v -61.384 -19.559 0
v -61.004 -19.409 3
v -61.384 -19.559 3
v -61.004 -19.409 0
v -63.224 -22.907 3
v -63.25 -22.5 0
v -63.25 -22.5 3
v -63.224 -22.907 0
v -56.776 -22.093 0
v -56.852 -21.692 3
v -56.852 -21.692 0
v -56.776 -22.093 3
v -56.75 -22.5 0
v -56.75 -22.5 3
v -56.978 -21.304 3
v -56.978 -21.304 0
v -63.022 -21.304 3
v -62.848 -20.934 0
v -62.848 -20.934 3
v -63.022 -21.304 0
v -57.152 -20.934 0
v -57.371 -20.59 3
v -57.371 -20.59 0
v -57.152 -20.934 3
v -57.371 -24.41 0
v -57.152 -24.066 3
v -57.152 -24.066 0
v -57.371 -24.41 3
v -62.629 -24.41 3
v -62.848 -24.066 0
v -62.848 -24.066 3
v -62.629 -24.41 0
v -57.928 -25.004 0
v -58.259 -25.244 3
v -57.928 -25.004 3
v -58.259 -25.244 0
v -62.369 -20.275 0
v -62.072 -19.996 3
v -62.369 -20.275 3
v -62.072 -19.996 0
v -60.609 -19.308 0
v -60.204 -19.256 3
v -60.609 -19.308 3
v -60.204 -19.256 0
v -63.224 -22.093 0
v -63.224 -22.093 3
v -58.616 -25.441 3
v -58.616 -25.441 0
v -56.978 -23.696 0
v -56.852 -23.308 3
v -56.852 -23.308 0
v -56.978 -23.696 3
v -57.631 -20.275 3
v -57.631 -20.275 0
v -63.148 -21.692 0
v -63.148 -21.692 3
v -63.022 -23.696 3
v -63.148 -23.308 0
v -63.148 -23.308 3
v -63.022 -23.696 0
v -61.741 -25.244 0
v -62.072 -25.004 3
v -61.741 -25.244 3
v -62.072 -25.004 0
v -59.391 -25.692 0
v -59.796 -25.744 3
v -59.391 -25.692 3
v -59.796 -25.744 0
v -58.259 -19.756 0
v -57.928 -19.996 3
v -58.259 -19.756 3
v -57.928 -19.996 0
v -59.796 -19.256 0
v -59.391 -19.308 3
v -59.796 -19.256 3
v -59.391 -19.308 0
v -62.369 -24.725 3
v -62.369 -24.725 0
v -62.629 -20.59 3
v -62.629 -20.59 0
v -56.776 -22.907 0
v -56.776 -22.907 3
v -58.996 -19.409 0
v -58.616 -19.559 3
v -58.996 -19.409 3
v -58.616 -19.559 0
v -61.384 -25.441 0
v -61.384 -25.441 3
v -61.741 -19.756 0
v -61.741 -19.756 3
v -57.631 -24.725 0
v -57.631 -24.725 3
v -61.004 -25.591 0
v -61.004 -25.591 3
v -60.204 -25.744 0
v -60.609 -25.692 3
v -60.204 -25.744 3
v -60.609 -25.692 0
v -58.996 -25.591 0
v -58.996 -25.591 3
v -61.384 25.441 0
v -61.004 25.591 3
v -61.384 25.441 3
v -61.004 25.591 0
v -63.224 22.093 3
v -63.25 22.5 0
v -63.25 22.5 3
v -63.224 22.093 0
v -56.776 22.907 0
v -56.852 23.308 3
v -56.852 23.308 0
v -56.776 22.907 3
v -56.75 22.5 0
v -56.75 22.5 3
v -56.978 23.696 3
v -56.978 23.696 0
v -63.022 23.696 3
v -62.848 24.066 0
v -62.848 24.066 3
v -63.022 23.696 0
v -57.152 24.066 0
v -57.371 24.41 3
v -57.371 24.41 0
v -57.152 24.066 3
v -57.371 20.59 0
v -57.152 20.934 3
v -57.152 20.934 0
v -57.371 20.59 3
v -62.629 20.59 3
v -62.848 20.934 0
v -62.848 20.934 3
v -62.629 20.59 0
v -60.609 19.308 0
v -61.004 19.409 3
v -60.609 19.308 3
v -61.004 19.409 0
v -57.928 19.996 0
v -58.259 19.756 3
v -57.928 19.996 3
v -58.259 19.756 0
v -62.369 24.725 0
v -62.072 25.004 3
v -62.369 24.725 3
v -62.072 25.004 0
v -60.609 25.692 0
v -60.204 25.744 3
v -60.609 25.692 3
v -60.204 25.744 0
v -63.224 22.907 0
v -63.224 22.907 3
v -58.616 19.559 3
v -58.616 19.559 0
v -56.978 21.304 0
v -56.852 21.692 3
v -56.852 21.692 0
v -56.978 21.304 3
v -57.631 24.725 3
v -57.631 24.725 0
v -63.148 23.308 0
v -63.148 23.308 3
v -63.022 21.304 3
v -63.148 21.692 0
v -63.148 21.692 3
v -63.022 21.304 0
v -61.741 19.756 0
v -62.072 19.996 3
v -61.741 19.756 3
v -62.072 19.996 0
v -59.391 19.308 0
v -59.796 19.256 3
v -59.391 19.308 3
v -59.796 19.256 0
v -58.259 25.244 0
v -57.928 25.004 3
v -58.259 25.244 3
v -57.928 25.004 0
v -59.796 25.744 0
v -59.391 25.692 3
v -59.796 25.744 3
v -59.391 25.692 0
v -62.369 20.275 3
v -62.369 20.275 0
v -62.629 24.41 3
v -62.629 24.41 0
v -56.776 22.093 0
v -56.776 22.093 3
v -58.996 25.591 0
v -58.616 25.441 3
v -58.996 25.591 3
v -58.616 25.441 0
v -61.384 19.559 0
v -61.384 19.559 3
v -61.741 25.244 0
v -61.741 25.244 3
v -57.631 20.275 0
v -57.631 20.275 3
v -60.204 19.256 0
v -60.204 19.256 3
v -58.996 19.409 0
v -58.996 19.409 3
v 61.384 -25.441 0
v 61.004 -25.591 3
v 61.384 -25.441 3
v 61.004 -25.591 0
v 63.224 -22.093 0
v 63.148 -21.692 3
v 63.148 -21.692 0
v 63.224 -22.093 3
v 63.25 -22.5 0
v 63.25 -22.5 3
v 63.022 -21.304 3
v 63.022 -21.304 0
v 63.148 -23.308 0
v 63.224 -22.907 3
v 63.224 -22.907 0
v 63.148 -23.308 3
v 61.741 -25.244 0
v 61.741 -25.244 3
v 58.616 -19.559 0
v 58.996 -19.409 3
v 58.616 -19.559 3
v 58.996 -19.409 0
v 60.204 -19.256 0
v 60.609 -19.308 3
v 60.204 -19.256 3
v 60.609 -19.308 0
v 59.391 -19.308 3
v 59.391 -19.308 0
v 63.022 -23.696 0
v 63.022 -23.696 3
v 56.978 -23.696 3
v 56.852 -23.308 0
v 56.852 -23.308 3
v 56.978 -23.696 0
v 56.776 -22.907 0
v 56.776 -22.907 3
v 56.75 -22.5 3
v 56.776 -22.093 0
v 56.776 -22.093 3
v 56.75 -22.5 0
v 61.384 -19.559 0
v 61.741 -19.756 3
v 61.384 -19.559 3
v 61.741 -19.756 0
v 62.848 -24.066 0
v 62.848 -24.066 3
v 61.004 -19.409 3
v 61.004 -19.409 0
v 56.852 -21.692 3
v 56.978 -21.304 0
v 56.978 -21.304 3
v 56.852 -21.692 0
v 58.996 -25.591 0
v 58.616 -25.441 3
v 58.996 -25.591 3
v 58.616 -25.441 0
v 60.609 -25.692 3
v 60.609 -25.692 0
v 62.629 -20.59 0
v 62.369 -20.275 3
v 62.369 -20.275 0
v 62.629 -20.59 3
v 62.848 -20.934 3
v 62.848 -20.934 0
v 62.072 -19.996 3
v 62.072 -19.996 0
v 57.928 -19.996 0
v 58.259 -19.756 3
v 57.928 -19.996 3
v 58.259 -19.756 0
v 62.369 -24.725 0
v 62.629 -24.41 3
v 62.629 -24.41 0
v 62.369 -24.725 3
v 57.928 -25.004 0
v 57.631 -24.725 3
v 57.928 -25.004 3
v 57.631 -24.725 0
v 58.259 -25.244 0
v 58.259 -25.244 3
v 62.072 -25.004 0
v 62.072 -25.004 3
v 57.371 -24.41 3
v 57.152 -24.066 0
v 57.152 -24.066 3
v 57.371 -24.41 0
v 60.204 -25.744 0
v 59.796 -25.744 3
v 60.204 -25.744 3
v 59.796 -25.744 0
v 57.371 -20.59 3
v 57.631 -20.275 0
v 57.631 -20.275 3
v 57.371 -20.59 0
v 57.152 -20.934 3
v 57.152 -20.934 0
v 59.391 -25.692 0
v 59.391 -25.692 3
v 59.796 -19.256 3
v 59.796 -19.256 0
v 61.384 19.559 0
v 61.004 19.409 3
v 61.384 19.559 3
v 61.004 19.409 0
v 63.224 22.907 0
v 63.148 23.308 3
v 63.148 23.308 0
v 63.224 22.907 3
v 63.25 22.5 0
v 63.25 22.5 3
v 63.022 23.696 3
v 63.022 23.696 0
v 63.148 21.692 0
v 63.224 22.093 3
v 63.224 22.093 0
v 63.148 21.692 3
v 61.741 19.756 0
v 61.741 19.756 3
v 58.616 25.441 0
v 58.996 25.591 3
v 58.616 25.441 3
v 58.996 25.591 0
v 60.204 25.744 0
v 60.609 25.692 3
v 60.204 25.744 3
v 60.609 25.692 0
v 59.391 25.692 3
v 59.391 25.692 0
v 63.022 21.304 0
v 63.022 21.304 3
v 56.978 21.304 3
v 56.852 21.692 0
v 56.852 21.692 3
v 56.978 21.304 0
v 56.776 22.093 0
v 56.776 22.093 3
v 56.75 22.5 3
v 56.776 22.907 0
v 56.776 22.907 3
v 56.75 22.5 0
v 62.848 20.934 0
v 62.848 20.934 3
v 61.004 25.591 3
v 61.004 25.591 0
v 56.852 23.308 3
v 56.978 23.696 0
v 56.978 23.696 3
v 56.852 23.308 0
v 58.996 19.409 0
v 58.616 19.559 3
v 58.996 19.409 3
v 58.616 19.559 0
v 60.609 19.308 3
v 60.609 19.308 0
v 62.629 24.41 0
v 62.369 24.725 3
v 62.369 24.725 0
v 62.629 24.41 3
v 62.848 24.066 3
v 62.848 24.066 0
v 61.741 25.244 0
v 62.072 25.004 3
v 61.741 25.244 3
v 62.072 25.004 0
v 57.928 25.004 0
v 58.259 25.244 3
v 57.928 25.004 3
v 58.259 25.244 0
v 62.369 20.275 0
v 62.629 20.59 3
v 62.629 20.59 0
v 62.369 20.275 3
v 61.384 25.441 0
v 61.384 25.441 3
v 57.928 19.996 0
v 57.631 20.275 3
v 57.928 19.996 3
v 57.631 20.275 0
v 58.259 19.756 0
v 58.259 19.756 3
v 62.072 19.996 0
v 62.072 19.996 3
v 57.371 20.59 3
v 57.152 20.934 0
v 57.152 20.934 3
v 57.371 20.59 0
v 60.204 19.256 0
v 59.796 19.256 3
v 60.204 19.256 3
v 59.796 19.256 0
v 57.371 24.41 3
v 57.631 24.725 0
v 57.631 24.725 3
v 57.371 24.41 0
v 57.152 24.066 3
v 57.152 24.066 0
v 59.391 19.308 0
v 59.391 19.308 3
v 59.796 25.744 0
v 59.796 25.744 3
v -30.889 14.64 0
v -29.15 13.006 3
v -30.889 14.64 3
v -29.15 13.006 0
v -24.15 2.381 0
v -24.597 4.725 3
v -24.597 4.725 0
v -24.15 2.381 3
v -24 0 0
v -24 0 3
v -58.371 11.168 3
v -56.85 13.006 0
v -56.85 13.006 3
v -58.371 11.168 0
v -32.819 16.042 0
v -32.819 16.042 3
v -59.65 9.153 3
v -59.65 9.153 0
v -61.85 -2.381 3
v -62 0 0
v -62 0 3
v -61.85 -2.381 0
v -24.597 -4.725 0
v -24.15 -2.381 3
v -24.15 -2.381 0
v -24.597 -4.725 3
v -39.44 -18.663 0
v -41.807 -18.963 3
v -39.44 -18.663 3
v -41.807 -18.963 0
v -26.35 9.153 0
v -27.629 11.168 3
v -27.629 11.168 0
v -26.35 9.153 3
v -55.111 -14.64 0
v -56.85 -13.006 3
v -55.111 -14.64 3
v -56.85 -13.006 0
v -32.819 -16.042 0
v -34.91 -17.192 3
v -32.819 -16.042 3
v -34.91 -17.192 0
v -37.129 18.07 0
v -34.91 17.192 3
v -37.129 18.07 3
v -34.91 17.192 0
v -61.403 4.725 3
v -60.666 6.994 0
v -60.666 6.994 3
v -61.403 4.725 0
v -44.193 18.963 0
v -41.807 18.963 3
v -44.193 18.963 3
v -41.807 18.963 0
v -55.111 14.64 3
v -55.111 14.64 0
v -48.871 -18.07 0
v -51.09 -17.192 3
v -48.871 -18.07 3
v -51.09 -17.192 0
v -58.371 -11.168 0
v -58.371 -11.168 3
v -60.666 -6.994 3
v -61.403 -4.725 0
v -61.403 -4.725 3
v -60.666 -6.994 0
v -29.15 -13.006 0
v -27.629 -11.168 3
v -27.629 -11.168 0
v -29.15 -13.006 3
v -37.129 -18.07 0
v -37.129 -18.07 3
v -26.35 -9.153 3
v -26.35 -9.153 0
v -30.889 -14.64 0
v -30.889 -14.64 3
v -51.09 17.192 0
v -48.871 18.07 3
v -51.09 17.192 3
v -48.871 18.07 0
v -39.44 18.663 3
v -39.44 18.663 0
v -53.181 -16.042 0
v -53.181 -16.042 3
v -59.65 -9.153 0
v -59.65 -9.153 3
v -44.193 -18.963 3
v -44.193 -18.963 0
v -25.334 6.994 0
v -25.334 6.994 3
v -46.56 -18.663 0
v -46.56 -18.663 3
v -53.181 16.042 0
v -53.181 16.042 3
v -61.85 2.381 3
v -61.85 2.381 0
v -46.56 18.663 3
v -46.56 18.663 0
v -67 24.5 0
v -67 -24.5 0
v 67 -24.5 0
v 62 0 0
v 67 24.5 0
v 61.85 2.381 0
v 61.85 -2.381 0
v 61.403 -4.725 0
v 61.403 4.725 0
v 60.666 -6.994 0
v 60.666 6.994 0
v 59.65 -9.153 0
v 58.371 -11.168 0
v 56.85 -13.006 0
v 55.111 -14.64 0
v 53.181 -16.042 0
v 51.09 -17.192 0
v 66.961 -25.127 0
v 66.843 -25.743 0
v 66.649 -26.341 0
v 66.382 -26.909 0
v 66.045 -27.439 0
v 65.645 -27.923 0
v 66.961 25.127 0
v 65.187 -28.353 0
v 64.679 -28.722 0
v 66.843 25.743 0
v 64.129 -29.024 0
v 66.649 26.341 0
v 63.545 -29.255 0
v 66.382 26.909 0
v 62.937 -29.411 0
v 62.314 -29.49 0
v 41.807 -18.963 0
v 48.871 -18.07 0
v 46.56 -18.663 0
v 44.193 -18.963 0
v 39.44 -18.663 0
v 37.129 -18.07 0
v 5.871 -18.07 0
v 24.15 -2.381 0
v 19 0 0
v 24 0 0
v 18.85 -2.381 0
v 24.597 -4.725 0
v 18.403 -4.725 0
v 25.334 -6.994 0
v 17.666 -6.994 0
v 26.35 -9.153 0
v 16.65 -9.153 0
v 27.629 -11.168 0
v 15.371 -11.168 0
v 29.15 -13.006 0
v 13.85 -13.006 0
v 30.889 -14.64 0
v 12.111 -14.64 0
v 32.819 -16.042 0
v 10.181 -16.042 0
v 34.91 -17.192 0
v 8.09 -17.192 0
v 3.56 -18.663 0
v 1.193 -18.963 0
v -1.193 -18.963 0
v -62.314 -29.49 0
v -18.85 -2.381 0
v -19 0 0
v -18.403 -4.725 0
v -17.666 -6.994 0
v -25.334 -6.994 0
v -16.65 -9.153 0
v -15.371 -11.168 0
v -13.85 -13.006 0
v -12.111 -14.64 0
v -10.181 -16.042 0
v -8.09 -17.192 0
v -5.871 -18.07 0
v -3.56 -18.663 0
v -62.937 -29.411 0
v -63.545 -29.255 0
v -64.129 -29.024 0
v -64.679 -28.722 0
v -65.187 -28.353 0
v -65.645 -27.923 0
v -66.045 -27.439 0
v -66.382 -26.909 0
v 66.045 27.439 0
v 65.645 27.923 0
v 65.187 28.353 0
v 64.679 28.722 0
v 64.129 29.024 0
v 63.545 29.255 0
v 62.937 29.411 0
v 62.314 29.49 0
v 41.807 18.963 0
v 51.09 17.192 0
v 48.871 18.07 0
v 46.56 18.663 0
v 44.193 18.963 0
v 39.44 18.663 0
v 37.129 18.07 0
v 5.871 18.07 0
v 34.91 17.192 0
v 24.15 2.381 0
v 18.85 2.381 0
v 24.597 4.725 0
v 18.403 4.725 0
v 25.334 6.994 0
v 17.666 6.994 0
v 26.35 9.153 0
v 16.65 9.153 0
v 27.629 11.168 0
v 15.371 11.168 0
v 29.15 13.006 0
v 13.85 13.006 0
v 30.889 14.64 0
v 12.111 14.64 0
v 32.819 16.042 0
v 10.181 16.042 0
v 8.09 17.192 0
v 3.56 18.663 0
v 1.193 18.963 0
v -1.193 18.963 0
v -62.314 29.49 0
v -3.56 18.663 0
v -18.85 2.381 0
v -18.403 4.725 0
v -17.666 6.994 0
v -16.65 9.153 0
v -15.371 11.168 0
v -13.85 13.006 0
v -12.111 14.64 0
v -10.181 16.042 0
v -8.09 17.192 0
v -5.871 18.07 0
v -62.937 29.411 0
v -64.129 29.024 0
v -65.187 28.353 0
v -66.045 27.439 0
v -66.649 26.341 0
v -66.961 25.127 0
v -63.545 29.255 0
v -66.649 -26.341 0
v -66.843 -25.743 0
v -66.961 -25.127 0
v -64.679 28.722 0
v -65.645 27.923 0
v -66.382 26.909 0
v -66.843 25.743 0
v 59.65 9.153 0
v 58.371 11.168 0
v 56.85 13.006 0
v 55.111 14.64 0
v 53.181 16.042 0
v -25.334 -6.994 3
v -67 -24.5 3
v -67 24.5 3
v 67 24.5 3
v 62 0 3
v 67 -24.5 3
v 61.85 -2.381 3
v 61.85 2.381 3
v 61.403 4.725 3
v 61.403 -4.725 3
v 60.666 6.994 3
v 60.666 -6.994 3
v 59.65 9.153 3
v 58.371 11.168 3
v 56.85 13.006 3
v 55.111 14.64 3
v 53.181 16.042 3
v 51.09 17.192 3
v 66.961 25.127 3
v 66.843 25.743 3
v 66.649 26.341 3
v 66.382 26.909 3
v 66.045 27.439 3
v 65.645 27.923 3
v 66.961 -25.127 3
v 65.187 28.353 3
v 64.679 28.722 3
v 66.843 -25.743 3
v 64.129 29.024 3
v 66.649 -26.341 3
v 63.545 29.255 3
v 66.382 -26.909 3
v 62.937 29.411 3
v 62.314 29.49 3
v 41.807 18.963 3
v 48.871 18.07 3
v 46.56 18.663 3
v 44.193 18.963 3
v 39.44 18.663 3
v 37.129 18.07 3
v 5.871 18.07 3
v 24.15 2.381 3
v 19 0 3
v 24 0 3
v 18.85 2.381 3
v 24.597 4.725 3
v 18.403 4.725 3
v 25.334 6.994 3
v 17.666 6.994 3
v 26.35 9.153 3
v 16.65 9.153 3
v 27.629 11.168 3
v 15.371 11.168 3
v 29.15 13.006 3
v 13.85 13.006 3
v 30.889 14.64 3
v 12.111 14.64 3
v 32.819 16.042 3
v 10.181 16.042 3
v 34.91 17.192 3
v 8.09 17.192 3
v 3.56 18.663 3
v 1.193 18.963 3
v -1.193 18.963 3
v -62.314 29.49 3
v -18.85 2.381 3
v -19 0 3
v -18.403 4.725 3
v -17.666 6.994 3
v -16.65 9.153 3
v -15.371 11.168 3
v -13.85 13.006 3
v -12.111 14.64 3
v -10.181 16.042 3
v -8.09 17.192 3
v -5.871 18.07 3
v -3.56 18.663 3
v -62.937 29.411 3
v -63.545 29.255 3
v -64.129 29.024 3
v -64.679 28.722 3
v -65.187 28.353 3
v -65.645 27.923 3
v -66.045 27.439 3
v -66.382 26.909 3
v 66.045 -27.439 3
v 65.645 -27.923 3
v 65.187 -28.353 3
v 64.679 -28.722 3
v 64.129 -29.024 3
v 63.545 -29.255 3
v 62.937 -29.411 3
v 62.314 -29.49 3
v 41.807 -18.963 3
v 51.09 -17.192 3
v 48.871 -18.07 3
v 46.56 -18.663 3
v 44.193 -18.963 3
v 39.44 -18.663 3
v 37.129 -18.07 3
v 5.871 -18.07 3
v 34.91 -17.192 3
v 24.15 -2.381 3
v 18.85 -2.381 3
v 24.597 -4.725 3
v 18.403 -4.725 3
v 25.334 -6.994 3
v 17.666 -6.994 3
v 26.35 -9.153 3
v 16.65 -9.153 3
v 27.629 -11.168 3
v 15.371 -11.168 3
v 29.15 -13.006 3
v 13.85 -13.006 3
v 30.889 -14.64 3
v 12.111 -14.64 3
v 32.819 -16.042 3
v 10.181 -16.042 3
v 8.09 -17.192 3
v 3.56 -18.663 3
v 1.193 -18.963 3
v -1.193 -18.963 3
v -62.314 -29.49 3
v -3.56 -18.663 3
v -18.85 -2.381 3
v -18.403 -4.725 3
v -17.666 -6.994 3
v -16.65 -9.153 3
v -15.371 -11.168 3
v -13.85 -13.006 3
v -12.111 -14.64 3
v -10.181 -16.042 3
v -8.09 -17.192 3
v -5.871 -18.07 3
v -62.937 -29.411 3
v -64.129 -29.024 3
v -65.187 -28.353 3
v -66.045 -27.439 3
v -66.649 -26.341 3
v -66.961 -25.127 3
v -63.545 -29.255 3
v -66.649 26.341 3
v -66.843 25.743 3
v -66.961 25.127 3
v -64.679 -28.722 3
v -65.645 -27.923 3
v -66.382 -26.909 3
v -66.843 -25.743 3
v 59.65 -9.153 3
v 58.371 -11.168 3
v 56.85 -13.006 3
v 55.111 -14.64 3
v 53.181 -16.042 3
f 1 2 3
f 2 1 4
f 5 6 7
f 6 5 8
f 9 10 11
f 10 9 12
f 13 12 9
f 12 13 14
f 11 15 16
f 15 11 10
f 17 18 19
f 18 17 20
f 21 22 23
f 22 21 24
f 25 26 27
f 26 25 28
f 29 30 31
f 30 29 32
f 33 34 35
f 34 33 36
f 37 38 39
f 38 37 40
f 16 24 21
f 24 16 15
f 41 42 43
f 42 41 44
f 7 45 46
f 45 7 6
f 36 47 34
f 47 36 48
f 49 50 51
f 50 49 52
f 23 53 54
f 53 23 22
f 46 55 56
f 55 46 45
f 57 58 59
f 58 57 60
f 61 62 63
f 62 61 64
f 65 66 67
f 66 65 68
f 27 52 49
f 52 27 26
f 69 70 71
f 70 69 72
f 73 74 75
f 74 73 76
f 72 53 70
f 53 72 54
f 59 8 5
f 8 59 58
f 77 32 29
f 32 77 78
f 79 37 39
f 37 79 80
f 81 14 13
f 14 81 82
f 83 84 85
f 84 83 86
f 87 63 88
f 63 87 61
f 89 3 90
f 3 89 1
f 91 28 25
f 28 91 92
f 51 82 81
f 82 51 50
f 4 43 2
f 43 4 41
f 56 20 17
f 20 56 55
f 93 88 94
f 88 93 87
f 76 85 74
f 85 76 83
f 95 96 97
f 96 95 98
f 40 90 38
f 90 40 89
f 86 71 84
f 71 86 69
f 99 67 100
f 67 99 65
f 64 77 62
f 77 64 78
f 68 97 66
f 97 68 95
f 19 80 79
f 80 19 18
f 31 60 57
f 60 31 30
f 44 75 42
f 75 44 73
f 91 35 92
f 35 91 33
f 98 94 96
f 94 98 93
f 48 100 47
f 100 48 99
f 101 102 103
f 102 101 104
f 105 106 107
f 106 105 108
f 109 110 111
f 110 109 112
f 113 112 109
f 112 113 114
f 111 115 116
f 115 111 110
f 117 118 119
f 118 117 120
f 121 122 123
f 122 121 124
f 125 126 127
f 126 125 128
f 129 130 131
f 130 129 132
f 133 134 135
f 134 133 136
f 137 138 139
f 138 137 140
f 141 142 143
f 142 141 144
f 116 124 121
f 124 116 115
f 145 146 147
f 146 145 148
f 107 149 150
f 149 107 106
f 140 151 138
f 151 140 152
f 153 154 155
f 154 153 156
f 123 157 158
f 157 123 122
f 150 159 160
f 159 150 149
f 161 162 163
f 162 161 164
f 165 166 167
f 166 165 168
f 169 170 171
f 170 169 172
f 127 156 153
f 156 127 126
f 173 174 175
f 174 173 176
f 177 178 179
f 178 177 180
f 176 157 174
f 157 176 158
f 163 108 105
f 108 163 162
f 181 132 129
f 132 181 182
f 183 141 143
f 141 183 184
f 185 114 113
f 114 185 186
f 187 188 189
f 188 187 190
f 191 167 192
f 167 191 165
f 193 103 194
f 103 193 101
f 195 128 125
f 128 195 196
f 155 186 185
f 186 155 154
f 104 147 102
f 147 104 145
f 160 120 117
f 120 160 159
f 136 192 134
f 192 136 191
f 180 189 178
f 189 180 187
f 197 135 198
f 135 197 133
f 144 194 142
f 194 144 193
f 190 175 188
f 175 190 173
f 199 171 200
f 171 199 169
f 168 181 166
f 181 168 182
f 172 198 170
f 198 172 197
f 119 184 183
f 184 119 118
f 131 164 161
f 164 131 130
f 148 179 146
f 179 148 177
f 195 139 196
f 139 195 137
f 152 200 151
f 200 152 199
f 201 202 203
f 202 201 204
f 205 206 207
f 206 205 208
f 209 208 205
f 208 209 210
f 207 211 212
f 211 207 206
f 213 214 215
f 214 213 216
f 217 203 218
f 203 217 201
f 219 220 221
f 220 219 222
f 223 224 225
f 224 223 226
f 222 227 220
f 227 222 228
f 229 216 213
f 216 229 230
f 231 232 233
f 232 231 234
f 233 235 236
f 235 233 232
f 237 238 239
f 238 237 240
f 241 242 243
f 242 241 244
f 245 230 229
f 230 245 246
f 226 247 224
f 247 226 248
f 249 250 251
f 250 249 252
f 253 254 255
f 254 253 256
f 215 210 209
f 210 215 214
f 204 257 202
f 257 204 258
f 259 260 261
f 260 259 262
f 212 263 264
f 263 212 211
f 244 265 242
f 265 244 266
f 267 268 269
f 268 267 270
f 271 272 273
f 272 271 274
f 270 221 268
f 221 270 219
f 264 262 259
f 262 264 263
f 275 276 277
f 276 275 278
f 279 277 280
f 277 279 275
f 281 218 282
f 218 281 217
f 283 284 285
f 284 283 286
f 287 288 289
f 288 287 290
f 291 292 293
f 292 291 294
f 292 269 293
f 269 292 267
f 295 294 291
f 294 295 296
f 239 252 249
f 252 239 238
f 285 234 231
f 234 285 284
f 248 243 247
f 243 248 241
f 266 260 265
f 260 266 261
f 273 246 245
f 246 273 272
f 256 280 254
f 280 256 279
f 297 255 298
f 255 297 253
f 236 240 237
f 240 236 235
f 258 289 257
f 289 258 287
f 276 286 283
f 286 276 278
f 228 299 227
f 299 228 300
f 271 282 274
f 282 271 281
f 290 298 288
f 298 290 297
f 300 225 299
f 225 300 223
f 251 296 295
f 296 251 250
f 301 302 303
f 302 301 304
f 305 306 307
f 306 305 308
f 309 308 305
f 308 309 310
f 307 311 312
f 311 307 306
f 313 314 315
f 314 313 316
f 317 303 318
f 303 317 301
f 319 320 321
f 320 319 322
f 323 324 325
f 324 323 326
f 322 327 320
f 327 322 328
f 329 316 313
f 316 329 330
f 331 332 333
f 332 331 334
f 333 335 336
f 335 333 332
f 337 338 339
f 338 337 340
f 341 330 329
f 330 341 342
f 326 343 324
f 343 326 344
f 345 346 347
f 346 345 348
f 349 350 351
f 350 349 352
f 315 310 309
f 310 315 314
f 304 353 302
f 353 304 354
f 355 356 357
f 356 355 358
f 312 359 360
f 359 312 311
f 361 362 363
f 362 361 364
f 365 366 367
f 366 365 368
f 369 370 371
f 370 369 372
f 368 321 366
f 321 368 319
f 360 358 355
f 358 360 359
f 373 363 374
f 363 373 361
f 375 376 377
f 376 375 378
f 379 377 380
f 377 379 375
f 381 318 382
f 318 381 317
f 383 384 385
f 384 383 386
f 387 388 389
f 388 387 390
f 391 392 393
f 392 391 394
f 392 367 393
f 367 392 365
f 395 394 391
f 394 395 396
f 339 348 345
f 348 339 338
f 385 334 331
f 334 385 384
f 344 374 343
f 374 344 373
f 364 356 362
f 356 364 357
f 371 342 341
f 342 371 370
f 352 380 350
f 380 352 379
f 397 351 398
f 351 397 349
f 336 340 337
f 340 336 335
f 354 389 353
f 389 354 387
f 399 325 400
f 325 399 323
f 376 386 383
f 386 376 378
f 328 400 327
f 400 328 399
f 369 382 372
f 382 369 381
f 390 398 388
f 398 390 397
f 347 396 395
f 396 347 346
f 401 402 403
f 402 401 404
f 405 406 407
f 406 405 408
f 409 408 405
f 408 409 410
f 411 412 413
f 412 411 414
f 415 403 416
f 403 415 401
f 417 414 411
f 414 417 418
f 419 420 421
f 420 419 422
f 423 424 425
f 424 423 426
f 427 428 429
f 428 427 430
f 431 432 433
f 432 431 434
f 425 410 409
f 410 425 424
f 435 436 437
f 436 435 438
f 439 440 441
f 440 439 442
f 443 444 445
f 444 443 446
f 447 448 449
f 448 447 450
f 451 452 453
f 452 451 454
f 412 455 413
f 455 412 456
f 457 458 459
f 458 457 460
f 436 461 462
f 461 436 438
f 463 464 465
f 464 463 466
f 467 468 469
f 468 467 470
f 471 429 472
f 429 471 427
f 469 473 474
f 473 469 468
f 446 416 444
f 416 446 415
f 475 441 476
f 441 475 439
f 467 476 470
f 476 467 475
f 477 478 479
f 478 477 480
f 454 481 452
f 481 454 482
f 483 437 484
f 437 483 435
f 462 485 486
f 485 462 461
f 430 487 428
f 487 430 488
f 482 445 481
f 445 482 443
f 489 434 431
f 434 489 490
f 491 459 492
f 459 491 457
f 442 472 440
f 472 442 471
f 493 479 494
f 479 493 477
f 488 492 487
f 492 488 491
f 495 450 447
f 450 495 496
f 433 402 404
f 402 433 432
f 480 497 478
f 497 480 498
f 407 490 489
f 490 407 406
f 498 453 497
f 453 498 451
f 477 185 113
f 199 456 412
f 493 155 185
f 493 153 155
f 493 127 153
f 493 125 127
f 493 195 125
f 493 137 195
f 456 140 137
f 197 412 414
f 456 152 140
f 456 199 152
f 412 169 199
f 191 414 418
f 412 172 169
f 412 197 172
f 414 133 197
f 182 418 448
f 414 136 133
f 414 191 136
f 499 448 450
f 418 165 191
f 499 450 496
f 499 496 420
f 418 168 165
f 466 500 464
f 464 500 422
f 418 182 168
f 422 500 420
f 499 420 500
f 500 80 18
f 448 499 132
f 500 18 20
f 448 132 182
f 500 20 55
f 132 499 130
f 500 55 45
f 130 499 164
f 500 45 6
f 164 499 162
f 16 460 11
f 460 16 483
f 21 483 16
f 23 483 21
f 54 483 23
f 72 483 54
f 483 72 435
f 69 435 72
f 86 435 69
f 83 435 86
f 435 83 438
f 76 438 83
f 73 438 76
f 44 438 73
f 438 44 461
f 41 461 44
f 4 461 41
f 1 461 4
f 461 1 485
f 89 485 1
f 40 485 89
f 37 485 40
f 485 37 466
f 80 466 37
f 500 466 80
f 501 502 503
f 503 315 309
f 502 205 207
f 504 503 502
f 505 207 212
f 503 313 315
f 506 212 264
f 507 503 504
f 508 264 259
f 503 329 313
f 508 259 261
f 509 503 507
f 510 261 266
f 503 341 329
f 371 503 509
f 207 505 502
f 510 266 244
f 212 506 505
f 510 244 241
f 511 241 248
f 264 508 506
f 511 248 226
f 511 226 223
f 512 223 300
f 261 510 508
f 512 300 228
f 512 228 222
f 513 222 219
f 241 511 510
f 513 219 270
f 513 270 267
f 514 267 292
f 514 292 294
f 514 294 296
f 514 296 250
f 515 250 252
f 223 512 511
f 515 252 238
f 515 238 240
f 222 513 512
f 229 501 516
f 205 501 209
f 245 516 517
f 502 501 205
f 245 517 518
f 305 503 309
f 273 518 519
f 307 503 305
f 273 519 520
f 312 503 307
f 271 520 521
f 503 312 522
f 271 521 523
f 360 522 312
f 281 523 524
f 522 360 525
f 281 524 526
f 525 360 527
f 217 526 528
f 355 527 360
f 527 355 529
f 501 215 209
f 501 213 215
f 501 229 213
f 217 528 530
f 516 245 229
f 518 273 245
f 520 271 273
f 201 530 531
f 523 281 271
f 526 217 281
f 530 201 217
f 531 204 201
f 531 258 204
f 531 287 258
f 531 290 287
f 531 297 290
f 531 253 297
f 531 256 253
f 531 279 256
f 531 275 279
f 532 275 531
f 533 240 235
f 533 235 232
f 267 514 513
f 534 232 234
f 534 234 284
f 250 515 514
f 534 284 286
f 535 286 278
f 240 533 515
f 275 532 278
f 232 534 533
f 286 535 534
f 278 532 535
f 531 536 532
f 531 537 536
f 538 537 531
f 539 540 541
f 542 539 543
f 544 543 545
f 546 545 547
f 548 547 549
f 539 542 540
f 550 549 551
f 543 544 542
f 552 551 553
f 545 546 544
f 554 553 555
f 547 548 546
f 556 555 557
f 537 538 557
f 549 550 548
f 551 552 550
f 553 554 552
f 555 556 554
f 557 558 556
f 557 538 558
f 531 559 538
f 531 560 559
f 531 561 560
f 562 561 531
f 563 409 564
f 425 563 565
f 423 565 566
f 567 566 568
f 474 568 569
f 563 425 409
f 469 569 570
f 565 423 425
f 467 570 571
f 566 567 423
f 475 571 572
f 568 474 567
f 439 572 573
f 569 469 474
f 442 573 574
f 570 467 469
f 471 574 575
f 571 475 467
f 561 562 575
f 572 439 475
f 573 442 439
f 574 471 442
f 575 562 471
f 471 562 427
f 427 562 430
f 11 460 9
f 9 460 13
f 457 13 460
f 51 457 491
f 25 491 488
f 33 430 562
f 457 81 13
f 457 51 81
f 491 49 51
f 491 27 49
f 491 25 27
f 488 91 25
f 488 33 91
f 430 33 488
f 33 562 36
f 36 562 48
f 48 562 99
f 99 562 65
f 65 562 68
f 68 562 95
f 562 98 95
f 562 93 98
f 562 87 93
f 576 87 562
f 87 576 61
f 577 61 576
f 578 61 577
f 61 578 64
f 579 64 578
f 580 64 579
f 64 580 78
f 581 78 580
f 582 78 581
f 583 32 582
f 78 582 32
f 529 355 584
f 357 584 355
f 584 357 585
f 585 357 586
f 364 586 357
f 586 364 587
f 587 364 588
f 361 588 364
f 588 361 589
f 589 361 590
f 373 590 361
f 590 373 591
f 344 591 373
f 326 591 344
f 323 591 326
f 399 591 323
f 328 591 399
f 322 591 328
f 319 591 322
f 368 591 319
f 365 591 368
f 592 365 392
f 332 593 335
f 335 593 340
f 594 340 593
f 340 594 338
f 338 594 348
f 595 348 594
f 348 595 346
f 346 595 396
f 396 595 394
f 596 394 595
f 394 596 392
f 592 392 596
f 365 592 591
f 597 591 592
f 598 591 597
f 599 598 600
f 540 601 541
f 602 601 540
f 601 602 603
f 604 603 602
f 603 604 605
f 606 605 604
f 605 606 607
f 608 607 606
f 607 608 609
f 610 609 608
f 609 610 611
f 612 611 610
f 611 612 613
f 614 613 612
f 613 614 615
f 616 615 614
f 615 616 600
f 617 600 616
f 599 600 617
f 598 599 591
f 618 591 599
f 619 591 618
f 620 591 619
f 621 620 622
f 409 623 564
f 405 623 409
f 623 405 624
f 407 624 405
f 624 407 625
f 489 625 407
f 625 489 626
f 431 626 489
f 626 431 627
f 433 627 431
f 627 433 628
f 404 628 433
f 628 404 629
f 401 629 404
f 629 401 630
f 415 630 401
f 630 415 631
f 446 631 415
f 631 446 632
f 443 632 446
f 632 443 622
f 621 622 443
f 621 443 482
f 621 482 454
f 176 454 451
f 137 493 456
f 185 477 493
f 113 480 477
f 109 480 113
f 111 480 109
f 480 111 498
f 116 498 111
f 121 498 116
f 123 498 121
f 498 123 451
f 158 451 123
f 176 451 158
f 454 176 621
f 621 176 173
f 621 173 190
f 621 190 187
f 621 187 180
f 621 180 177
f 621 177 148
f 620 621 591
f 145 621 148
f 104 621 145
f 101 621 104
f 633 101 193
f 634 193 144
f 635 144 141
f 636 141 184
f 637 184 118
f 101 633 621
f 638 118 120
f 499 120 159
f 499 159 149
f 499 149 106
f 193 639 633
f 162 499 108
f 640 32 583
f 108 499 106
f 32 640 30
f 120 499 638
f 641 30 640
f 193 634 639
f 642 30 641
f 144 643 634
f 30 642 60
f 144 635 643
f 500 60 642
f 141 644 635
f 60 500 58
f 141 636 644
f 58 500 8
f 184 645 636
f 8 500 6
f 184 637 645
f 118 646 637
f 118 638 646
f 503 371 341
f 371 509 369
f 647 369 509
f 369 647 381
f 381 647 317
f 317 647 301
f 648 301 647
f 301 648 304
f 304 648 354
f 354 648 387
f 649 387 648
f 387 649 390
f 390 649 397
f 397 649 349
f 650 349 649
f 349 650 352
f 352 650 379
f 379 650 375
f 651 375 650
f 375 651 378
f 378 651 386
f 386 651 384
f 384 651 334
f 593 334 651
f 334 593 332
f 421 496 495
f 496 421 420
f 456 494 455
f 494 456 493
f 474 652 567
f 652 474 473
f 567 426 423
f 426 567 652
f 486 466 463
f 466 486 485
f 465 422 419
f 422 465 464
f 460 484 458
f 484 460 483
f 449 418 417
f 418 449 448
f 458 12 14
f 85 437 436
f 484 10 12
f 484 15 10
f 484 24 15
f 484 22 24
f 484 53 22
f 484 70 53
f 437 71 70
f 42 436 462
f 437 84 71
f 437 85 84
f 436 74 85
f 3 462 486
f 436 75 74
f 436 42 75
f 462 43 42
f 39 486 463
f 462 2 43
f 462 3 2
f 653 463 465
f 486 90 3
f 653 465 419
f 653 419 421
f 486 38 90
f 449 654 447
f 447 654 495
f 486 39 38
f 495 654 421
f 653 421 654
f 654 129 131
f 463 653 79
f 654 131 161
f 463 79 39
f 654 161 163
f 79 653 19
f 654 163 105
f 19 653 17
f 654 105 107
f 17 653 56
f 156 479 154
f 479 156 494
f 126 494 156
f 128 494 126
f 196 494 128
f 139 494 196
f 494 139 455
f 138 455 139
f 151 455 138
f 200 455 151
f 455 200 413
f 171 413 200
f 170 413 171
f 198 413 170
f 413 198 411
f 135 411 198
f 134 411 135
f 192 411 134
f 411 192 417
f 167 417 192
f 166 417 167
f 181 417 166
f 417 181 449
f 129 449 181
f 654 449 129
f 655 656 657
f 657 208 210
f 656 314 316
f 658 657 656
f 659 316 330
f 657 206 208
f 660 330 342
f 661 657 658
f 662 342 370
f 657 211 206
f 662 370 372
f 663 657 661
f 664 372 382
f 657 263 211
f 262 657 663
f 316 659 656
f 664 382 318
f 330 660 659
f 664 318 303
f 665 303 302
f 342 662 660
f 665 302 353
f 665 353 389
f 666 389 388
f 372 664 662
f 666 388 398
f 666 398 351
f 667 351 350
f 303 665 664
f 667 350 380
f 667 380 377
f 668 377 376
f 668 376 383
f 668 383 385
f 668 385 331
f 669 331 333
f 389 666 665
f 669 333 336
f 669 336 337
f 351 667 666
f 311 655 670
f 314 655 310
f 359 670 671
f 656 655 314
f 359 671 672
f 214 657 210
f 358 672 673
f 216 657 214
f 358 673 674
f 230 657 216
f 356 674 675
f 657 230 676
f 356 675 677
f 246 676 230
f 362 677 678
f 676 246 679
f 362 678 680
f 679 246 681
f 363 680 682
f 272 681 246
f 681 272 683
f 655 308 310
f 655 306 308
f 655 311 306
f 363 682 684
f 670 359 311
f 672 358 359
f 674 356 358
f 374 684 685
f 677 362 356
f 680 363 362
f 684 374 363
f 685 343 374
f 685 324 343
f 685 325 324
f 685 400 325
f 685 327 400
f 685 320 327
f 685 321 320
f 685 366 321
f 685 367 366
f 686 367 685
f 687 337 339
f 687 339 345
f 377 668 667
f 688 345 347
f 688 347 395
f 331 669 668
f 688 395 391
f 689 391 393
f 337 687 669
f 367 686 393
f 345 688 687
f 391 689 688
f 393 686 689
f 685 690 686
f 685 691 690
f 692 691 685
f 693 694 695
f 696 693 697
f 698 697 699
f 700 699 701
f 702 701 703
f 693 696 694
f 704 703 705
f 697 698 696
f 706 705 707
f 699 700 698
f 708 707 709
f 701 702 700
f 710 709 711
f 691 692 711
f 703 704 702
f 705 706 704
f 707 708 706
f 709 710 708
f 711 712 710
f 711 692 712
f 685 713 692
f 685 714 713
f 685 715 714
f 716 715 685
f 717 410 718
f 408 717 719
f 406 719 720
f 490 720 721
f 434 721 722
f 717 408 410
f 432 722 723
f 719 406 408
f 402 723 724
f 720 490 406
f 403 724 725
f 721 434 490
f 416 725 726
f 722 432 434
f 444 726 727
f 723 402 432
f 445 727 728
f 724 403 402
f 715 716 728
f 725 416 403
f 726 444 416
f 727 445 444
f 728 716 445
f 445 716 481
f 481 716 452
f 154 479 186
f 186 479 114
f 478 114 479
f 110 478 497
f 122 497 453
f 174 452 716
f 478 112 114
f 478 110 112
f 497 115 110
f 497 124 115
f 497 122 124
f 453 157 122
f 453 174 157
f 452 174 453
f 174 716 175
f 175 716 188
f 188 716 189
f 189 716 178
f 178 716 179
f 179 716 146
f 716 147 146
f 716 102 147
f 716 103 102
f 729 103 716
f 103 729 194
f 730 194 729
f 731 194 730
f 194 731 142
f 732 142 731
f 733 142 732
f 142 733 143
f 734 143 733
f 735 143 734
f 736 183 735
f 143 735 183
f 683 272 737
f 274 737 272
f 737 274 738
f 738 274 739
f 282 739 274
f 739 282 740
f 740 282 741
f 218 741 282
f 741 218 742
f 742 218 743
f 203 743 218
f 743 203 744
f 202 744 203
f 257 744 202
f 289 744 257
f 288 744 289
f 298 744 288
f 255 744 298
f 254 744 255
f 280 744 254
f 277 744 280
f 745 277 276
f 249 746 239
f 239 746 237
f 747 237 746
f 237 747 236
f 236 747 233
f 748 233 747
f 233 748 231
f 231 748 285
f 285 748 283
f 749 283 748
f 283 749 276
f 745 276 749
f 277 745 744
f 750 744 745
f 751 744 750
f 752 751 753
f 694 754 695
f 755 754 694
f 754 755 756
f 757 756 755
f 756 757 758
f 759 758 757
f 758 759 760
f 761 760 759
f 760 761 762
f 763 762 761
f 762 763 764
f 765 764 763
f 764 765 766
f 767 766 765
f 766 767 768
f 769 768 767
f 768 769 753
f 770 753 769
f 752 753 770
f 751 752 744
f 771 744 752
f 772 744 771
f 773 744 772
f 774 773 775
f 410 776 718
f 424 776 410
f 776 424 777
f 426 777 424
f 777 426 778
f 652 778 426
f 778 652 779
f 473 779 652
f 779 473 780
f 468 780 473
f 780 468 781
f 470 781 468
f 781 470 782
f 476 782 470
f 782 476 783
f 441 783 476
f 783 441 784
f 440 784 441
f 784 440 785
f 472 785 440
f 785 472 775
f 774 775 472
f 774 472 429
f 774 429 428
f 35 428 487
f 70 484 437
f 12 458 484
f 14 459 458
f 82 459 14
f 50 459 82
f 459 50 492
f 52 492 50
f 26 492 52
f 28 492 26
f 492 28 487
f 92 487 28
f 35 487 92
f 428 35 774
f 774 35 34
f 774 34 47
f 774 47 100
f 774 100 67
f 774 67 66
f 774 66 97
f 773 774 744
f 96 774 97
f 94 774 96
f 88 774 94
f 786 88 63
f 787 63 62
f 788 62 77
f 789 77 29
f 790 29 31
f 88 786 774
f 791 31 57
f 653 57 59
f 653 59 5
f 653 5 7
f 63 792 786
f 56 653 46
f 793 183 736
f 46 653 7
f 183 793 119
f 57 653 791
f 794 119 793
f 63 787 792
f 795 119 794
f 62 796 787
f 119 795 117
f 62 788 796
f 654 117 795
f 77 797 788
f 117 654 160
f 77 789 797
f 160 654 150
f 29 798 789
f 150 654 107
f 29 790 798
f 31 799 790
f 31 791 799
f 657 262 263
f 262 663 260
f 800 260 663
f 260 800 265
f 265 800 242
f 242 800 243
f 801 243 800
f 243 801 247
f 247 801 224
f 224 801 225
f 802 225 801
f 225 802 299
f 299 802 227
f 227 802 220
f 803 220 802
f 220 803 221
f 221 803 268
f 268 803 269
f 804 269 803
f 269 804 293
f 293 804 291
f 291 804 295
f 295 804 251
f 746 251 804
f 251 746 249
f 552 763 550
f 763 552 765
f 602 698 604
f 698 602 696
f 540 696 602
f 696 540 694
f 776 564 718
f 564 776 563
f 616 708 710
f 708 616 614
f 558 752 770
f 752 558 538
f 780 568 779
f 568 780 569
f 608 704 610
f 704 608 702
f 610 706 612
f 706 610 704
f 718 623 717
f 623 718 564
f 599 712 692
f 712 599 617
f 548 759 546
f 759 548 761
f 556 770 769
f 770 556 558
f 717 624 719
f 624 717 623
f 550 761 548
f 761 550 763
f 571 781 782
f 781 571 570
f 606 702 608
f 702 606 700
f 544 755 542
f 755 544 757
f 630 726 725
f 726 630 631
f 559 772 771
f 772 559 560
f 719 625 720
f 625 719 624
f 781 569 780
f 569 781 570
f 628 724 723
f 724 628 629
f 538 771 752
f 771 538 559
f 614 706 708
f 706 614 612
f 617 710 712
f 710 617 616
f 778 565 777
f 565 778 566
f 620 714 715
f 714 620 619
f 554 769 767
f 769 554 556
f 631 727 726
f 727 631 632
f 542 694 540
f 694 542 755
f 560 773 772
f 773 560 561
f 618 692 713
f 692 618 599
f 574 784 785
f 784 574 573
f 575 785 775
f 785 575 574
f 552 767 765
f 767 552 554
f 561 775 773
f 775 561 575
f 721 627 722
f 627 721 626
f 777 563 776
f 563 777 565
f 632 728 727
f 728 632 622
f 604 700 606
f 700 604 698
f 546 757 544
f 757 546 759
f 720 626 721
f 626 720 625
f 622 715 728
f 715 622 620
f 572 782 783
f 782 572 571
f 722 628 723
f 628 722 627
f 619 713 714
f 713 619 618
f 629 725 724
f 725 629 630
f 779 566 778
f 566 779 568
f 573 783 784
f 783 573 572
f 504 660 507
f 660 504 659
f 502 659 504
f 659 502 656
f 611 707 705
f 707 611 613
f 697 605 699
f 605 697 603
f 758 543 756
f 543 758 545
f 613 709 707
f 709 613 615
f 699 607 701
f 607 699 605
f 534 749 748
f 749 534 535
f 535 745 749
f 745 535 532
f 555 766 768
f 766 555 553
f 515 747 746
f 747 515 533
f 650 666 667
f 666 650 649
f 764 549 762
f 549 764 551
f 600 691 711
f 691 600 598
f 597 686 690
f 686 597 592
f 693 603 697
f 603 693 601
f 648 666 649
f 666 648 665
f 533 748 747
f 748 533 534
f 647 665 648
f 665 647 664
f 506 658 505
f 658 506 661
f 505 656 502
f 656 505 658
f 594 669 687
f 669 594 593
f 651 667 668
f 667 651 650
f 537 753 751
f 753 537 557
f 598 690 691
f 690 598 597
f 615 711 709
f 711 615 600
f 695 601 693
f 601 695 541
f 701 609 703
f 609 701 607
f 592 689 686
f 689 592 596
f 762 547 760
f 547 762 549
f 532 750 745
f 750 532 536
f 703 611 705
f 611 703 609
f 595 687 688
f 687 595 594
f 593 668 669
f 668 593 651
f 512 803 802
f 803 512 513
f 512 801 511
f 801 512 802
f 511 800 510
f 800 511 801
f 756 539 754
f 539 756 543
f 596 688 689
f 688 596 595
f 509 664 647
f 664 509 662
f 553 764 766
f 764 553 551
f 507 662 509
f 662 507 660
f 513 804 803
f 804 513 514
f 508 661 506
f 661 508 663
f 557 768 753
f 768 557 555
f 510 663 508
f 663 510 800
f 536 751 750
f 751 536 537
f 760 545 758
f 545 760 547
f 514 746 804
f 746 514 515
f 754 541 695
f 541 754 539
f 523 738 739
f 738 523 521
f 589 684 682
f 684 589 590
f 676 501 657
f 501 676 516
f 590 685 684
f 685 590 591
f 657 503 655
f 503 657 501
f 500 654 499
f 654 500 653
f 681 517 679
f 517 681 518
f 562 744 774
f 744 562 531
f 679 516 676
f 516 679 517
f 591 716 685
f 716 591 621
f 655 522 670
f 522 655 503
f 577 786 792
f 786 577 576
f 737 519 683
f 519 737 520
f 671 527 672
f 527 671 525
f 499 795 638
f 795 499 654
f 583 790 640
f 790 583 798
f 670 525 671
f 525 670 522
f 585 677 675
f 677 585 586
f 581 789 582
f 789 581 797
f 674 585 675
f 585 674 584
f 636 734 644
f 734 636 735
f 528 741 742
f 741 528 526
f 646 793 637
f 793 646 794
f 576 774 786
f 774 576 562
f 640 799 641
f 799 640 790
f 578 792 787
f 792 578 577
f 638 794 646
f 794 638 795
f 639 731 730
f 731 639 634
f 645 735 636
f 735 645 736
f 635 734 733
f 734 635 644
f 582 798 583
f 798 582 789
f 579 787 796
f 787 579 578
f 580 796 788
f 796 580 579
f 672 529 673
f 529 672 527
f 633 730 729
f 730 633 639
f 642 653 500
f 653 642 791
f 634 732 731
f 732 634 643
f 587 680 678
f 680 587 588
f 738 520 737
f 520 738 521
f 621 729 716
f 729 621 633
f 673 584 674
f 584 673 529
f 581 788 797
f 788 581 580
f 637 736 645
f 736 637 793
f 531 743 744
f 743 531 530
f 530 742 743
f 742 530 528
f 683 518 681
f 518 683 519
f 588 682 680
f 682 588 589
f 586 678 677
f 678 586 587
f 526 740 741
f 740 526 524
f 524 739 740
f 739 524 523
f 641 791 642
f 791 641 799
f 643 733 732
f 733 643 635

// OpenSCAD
$fn = 50;


difference() {
	union() {
		hull() {
			translate(v = [-62.0000000000, 24.5000000000, 0]) {
				cylinder(h = 3, r = 5);
			}
			translate(v = [62.0000000000, 24.5000000000, 0]) {
				cylinder(h = 3, r = 5);
			}
			translate(v = [-62.0000000000, -24.5000000000, 0]) {
				cylinder(h = 3, r = 5);
			}
			translate(v = [62.0000000000, -24.5000000000, 0]) {
				cylinder(h = 3, r = 5);
			}
		}
	}
	union() {
		#translate(v = [-60.0000000000, -22.5000000000, -100.0000000000]) {
			cylinder(h = 200, r = 3.2500000000);
		}
		#translate(v = [-60.0000000000, 22.5000000000, -100.0000000000]) {
			cylinder(h = 200, r = 3.2500000000);
		}
		#translate(v = [60.0000000000, -22.5000000000, -100.0000000000]) {
			cylinder(h = 200, r = 3.2500000000);
		}
		#translate(v = [60.0000000000, 22.5000000000, -100.0000000000]) {
			cylinder(h = 200, r = 3.2500000000);
		}
		#translate(v = [-43.0000000000, 0, 0]) {
			cylinder(h = 3, r = 19.0000000000);
		}
		#cylinder(h = 3, r = 19.0000000000);
		#translate(v = [43.0000000000, 0, 0]) {
			cylinder(h = 3, r = 19.0000000000);
		}
	}
}
